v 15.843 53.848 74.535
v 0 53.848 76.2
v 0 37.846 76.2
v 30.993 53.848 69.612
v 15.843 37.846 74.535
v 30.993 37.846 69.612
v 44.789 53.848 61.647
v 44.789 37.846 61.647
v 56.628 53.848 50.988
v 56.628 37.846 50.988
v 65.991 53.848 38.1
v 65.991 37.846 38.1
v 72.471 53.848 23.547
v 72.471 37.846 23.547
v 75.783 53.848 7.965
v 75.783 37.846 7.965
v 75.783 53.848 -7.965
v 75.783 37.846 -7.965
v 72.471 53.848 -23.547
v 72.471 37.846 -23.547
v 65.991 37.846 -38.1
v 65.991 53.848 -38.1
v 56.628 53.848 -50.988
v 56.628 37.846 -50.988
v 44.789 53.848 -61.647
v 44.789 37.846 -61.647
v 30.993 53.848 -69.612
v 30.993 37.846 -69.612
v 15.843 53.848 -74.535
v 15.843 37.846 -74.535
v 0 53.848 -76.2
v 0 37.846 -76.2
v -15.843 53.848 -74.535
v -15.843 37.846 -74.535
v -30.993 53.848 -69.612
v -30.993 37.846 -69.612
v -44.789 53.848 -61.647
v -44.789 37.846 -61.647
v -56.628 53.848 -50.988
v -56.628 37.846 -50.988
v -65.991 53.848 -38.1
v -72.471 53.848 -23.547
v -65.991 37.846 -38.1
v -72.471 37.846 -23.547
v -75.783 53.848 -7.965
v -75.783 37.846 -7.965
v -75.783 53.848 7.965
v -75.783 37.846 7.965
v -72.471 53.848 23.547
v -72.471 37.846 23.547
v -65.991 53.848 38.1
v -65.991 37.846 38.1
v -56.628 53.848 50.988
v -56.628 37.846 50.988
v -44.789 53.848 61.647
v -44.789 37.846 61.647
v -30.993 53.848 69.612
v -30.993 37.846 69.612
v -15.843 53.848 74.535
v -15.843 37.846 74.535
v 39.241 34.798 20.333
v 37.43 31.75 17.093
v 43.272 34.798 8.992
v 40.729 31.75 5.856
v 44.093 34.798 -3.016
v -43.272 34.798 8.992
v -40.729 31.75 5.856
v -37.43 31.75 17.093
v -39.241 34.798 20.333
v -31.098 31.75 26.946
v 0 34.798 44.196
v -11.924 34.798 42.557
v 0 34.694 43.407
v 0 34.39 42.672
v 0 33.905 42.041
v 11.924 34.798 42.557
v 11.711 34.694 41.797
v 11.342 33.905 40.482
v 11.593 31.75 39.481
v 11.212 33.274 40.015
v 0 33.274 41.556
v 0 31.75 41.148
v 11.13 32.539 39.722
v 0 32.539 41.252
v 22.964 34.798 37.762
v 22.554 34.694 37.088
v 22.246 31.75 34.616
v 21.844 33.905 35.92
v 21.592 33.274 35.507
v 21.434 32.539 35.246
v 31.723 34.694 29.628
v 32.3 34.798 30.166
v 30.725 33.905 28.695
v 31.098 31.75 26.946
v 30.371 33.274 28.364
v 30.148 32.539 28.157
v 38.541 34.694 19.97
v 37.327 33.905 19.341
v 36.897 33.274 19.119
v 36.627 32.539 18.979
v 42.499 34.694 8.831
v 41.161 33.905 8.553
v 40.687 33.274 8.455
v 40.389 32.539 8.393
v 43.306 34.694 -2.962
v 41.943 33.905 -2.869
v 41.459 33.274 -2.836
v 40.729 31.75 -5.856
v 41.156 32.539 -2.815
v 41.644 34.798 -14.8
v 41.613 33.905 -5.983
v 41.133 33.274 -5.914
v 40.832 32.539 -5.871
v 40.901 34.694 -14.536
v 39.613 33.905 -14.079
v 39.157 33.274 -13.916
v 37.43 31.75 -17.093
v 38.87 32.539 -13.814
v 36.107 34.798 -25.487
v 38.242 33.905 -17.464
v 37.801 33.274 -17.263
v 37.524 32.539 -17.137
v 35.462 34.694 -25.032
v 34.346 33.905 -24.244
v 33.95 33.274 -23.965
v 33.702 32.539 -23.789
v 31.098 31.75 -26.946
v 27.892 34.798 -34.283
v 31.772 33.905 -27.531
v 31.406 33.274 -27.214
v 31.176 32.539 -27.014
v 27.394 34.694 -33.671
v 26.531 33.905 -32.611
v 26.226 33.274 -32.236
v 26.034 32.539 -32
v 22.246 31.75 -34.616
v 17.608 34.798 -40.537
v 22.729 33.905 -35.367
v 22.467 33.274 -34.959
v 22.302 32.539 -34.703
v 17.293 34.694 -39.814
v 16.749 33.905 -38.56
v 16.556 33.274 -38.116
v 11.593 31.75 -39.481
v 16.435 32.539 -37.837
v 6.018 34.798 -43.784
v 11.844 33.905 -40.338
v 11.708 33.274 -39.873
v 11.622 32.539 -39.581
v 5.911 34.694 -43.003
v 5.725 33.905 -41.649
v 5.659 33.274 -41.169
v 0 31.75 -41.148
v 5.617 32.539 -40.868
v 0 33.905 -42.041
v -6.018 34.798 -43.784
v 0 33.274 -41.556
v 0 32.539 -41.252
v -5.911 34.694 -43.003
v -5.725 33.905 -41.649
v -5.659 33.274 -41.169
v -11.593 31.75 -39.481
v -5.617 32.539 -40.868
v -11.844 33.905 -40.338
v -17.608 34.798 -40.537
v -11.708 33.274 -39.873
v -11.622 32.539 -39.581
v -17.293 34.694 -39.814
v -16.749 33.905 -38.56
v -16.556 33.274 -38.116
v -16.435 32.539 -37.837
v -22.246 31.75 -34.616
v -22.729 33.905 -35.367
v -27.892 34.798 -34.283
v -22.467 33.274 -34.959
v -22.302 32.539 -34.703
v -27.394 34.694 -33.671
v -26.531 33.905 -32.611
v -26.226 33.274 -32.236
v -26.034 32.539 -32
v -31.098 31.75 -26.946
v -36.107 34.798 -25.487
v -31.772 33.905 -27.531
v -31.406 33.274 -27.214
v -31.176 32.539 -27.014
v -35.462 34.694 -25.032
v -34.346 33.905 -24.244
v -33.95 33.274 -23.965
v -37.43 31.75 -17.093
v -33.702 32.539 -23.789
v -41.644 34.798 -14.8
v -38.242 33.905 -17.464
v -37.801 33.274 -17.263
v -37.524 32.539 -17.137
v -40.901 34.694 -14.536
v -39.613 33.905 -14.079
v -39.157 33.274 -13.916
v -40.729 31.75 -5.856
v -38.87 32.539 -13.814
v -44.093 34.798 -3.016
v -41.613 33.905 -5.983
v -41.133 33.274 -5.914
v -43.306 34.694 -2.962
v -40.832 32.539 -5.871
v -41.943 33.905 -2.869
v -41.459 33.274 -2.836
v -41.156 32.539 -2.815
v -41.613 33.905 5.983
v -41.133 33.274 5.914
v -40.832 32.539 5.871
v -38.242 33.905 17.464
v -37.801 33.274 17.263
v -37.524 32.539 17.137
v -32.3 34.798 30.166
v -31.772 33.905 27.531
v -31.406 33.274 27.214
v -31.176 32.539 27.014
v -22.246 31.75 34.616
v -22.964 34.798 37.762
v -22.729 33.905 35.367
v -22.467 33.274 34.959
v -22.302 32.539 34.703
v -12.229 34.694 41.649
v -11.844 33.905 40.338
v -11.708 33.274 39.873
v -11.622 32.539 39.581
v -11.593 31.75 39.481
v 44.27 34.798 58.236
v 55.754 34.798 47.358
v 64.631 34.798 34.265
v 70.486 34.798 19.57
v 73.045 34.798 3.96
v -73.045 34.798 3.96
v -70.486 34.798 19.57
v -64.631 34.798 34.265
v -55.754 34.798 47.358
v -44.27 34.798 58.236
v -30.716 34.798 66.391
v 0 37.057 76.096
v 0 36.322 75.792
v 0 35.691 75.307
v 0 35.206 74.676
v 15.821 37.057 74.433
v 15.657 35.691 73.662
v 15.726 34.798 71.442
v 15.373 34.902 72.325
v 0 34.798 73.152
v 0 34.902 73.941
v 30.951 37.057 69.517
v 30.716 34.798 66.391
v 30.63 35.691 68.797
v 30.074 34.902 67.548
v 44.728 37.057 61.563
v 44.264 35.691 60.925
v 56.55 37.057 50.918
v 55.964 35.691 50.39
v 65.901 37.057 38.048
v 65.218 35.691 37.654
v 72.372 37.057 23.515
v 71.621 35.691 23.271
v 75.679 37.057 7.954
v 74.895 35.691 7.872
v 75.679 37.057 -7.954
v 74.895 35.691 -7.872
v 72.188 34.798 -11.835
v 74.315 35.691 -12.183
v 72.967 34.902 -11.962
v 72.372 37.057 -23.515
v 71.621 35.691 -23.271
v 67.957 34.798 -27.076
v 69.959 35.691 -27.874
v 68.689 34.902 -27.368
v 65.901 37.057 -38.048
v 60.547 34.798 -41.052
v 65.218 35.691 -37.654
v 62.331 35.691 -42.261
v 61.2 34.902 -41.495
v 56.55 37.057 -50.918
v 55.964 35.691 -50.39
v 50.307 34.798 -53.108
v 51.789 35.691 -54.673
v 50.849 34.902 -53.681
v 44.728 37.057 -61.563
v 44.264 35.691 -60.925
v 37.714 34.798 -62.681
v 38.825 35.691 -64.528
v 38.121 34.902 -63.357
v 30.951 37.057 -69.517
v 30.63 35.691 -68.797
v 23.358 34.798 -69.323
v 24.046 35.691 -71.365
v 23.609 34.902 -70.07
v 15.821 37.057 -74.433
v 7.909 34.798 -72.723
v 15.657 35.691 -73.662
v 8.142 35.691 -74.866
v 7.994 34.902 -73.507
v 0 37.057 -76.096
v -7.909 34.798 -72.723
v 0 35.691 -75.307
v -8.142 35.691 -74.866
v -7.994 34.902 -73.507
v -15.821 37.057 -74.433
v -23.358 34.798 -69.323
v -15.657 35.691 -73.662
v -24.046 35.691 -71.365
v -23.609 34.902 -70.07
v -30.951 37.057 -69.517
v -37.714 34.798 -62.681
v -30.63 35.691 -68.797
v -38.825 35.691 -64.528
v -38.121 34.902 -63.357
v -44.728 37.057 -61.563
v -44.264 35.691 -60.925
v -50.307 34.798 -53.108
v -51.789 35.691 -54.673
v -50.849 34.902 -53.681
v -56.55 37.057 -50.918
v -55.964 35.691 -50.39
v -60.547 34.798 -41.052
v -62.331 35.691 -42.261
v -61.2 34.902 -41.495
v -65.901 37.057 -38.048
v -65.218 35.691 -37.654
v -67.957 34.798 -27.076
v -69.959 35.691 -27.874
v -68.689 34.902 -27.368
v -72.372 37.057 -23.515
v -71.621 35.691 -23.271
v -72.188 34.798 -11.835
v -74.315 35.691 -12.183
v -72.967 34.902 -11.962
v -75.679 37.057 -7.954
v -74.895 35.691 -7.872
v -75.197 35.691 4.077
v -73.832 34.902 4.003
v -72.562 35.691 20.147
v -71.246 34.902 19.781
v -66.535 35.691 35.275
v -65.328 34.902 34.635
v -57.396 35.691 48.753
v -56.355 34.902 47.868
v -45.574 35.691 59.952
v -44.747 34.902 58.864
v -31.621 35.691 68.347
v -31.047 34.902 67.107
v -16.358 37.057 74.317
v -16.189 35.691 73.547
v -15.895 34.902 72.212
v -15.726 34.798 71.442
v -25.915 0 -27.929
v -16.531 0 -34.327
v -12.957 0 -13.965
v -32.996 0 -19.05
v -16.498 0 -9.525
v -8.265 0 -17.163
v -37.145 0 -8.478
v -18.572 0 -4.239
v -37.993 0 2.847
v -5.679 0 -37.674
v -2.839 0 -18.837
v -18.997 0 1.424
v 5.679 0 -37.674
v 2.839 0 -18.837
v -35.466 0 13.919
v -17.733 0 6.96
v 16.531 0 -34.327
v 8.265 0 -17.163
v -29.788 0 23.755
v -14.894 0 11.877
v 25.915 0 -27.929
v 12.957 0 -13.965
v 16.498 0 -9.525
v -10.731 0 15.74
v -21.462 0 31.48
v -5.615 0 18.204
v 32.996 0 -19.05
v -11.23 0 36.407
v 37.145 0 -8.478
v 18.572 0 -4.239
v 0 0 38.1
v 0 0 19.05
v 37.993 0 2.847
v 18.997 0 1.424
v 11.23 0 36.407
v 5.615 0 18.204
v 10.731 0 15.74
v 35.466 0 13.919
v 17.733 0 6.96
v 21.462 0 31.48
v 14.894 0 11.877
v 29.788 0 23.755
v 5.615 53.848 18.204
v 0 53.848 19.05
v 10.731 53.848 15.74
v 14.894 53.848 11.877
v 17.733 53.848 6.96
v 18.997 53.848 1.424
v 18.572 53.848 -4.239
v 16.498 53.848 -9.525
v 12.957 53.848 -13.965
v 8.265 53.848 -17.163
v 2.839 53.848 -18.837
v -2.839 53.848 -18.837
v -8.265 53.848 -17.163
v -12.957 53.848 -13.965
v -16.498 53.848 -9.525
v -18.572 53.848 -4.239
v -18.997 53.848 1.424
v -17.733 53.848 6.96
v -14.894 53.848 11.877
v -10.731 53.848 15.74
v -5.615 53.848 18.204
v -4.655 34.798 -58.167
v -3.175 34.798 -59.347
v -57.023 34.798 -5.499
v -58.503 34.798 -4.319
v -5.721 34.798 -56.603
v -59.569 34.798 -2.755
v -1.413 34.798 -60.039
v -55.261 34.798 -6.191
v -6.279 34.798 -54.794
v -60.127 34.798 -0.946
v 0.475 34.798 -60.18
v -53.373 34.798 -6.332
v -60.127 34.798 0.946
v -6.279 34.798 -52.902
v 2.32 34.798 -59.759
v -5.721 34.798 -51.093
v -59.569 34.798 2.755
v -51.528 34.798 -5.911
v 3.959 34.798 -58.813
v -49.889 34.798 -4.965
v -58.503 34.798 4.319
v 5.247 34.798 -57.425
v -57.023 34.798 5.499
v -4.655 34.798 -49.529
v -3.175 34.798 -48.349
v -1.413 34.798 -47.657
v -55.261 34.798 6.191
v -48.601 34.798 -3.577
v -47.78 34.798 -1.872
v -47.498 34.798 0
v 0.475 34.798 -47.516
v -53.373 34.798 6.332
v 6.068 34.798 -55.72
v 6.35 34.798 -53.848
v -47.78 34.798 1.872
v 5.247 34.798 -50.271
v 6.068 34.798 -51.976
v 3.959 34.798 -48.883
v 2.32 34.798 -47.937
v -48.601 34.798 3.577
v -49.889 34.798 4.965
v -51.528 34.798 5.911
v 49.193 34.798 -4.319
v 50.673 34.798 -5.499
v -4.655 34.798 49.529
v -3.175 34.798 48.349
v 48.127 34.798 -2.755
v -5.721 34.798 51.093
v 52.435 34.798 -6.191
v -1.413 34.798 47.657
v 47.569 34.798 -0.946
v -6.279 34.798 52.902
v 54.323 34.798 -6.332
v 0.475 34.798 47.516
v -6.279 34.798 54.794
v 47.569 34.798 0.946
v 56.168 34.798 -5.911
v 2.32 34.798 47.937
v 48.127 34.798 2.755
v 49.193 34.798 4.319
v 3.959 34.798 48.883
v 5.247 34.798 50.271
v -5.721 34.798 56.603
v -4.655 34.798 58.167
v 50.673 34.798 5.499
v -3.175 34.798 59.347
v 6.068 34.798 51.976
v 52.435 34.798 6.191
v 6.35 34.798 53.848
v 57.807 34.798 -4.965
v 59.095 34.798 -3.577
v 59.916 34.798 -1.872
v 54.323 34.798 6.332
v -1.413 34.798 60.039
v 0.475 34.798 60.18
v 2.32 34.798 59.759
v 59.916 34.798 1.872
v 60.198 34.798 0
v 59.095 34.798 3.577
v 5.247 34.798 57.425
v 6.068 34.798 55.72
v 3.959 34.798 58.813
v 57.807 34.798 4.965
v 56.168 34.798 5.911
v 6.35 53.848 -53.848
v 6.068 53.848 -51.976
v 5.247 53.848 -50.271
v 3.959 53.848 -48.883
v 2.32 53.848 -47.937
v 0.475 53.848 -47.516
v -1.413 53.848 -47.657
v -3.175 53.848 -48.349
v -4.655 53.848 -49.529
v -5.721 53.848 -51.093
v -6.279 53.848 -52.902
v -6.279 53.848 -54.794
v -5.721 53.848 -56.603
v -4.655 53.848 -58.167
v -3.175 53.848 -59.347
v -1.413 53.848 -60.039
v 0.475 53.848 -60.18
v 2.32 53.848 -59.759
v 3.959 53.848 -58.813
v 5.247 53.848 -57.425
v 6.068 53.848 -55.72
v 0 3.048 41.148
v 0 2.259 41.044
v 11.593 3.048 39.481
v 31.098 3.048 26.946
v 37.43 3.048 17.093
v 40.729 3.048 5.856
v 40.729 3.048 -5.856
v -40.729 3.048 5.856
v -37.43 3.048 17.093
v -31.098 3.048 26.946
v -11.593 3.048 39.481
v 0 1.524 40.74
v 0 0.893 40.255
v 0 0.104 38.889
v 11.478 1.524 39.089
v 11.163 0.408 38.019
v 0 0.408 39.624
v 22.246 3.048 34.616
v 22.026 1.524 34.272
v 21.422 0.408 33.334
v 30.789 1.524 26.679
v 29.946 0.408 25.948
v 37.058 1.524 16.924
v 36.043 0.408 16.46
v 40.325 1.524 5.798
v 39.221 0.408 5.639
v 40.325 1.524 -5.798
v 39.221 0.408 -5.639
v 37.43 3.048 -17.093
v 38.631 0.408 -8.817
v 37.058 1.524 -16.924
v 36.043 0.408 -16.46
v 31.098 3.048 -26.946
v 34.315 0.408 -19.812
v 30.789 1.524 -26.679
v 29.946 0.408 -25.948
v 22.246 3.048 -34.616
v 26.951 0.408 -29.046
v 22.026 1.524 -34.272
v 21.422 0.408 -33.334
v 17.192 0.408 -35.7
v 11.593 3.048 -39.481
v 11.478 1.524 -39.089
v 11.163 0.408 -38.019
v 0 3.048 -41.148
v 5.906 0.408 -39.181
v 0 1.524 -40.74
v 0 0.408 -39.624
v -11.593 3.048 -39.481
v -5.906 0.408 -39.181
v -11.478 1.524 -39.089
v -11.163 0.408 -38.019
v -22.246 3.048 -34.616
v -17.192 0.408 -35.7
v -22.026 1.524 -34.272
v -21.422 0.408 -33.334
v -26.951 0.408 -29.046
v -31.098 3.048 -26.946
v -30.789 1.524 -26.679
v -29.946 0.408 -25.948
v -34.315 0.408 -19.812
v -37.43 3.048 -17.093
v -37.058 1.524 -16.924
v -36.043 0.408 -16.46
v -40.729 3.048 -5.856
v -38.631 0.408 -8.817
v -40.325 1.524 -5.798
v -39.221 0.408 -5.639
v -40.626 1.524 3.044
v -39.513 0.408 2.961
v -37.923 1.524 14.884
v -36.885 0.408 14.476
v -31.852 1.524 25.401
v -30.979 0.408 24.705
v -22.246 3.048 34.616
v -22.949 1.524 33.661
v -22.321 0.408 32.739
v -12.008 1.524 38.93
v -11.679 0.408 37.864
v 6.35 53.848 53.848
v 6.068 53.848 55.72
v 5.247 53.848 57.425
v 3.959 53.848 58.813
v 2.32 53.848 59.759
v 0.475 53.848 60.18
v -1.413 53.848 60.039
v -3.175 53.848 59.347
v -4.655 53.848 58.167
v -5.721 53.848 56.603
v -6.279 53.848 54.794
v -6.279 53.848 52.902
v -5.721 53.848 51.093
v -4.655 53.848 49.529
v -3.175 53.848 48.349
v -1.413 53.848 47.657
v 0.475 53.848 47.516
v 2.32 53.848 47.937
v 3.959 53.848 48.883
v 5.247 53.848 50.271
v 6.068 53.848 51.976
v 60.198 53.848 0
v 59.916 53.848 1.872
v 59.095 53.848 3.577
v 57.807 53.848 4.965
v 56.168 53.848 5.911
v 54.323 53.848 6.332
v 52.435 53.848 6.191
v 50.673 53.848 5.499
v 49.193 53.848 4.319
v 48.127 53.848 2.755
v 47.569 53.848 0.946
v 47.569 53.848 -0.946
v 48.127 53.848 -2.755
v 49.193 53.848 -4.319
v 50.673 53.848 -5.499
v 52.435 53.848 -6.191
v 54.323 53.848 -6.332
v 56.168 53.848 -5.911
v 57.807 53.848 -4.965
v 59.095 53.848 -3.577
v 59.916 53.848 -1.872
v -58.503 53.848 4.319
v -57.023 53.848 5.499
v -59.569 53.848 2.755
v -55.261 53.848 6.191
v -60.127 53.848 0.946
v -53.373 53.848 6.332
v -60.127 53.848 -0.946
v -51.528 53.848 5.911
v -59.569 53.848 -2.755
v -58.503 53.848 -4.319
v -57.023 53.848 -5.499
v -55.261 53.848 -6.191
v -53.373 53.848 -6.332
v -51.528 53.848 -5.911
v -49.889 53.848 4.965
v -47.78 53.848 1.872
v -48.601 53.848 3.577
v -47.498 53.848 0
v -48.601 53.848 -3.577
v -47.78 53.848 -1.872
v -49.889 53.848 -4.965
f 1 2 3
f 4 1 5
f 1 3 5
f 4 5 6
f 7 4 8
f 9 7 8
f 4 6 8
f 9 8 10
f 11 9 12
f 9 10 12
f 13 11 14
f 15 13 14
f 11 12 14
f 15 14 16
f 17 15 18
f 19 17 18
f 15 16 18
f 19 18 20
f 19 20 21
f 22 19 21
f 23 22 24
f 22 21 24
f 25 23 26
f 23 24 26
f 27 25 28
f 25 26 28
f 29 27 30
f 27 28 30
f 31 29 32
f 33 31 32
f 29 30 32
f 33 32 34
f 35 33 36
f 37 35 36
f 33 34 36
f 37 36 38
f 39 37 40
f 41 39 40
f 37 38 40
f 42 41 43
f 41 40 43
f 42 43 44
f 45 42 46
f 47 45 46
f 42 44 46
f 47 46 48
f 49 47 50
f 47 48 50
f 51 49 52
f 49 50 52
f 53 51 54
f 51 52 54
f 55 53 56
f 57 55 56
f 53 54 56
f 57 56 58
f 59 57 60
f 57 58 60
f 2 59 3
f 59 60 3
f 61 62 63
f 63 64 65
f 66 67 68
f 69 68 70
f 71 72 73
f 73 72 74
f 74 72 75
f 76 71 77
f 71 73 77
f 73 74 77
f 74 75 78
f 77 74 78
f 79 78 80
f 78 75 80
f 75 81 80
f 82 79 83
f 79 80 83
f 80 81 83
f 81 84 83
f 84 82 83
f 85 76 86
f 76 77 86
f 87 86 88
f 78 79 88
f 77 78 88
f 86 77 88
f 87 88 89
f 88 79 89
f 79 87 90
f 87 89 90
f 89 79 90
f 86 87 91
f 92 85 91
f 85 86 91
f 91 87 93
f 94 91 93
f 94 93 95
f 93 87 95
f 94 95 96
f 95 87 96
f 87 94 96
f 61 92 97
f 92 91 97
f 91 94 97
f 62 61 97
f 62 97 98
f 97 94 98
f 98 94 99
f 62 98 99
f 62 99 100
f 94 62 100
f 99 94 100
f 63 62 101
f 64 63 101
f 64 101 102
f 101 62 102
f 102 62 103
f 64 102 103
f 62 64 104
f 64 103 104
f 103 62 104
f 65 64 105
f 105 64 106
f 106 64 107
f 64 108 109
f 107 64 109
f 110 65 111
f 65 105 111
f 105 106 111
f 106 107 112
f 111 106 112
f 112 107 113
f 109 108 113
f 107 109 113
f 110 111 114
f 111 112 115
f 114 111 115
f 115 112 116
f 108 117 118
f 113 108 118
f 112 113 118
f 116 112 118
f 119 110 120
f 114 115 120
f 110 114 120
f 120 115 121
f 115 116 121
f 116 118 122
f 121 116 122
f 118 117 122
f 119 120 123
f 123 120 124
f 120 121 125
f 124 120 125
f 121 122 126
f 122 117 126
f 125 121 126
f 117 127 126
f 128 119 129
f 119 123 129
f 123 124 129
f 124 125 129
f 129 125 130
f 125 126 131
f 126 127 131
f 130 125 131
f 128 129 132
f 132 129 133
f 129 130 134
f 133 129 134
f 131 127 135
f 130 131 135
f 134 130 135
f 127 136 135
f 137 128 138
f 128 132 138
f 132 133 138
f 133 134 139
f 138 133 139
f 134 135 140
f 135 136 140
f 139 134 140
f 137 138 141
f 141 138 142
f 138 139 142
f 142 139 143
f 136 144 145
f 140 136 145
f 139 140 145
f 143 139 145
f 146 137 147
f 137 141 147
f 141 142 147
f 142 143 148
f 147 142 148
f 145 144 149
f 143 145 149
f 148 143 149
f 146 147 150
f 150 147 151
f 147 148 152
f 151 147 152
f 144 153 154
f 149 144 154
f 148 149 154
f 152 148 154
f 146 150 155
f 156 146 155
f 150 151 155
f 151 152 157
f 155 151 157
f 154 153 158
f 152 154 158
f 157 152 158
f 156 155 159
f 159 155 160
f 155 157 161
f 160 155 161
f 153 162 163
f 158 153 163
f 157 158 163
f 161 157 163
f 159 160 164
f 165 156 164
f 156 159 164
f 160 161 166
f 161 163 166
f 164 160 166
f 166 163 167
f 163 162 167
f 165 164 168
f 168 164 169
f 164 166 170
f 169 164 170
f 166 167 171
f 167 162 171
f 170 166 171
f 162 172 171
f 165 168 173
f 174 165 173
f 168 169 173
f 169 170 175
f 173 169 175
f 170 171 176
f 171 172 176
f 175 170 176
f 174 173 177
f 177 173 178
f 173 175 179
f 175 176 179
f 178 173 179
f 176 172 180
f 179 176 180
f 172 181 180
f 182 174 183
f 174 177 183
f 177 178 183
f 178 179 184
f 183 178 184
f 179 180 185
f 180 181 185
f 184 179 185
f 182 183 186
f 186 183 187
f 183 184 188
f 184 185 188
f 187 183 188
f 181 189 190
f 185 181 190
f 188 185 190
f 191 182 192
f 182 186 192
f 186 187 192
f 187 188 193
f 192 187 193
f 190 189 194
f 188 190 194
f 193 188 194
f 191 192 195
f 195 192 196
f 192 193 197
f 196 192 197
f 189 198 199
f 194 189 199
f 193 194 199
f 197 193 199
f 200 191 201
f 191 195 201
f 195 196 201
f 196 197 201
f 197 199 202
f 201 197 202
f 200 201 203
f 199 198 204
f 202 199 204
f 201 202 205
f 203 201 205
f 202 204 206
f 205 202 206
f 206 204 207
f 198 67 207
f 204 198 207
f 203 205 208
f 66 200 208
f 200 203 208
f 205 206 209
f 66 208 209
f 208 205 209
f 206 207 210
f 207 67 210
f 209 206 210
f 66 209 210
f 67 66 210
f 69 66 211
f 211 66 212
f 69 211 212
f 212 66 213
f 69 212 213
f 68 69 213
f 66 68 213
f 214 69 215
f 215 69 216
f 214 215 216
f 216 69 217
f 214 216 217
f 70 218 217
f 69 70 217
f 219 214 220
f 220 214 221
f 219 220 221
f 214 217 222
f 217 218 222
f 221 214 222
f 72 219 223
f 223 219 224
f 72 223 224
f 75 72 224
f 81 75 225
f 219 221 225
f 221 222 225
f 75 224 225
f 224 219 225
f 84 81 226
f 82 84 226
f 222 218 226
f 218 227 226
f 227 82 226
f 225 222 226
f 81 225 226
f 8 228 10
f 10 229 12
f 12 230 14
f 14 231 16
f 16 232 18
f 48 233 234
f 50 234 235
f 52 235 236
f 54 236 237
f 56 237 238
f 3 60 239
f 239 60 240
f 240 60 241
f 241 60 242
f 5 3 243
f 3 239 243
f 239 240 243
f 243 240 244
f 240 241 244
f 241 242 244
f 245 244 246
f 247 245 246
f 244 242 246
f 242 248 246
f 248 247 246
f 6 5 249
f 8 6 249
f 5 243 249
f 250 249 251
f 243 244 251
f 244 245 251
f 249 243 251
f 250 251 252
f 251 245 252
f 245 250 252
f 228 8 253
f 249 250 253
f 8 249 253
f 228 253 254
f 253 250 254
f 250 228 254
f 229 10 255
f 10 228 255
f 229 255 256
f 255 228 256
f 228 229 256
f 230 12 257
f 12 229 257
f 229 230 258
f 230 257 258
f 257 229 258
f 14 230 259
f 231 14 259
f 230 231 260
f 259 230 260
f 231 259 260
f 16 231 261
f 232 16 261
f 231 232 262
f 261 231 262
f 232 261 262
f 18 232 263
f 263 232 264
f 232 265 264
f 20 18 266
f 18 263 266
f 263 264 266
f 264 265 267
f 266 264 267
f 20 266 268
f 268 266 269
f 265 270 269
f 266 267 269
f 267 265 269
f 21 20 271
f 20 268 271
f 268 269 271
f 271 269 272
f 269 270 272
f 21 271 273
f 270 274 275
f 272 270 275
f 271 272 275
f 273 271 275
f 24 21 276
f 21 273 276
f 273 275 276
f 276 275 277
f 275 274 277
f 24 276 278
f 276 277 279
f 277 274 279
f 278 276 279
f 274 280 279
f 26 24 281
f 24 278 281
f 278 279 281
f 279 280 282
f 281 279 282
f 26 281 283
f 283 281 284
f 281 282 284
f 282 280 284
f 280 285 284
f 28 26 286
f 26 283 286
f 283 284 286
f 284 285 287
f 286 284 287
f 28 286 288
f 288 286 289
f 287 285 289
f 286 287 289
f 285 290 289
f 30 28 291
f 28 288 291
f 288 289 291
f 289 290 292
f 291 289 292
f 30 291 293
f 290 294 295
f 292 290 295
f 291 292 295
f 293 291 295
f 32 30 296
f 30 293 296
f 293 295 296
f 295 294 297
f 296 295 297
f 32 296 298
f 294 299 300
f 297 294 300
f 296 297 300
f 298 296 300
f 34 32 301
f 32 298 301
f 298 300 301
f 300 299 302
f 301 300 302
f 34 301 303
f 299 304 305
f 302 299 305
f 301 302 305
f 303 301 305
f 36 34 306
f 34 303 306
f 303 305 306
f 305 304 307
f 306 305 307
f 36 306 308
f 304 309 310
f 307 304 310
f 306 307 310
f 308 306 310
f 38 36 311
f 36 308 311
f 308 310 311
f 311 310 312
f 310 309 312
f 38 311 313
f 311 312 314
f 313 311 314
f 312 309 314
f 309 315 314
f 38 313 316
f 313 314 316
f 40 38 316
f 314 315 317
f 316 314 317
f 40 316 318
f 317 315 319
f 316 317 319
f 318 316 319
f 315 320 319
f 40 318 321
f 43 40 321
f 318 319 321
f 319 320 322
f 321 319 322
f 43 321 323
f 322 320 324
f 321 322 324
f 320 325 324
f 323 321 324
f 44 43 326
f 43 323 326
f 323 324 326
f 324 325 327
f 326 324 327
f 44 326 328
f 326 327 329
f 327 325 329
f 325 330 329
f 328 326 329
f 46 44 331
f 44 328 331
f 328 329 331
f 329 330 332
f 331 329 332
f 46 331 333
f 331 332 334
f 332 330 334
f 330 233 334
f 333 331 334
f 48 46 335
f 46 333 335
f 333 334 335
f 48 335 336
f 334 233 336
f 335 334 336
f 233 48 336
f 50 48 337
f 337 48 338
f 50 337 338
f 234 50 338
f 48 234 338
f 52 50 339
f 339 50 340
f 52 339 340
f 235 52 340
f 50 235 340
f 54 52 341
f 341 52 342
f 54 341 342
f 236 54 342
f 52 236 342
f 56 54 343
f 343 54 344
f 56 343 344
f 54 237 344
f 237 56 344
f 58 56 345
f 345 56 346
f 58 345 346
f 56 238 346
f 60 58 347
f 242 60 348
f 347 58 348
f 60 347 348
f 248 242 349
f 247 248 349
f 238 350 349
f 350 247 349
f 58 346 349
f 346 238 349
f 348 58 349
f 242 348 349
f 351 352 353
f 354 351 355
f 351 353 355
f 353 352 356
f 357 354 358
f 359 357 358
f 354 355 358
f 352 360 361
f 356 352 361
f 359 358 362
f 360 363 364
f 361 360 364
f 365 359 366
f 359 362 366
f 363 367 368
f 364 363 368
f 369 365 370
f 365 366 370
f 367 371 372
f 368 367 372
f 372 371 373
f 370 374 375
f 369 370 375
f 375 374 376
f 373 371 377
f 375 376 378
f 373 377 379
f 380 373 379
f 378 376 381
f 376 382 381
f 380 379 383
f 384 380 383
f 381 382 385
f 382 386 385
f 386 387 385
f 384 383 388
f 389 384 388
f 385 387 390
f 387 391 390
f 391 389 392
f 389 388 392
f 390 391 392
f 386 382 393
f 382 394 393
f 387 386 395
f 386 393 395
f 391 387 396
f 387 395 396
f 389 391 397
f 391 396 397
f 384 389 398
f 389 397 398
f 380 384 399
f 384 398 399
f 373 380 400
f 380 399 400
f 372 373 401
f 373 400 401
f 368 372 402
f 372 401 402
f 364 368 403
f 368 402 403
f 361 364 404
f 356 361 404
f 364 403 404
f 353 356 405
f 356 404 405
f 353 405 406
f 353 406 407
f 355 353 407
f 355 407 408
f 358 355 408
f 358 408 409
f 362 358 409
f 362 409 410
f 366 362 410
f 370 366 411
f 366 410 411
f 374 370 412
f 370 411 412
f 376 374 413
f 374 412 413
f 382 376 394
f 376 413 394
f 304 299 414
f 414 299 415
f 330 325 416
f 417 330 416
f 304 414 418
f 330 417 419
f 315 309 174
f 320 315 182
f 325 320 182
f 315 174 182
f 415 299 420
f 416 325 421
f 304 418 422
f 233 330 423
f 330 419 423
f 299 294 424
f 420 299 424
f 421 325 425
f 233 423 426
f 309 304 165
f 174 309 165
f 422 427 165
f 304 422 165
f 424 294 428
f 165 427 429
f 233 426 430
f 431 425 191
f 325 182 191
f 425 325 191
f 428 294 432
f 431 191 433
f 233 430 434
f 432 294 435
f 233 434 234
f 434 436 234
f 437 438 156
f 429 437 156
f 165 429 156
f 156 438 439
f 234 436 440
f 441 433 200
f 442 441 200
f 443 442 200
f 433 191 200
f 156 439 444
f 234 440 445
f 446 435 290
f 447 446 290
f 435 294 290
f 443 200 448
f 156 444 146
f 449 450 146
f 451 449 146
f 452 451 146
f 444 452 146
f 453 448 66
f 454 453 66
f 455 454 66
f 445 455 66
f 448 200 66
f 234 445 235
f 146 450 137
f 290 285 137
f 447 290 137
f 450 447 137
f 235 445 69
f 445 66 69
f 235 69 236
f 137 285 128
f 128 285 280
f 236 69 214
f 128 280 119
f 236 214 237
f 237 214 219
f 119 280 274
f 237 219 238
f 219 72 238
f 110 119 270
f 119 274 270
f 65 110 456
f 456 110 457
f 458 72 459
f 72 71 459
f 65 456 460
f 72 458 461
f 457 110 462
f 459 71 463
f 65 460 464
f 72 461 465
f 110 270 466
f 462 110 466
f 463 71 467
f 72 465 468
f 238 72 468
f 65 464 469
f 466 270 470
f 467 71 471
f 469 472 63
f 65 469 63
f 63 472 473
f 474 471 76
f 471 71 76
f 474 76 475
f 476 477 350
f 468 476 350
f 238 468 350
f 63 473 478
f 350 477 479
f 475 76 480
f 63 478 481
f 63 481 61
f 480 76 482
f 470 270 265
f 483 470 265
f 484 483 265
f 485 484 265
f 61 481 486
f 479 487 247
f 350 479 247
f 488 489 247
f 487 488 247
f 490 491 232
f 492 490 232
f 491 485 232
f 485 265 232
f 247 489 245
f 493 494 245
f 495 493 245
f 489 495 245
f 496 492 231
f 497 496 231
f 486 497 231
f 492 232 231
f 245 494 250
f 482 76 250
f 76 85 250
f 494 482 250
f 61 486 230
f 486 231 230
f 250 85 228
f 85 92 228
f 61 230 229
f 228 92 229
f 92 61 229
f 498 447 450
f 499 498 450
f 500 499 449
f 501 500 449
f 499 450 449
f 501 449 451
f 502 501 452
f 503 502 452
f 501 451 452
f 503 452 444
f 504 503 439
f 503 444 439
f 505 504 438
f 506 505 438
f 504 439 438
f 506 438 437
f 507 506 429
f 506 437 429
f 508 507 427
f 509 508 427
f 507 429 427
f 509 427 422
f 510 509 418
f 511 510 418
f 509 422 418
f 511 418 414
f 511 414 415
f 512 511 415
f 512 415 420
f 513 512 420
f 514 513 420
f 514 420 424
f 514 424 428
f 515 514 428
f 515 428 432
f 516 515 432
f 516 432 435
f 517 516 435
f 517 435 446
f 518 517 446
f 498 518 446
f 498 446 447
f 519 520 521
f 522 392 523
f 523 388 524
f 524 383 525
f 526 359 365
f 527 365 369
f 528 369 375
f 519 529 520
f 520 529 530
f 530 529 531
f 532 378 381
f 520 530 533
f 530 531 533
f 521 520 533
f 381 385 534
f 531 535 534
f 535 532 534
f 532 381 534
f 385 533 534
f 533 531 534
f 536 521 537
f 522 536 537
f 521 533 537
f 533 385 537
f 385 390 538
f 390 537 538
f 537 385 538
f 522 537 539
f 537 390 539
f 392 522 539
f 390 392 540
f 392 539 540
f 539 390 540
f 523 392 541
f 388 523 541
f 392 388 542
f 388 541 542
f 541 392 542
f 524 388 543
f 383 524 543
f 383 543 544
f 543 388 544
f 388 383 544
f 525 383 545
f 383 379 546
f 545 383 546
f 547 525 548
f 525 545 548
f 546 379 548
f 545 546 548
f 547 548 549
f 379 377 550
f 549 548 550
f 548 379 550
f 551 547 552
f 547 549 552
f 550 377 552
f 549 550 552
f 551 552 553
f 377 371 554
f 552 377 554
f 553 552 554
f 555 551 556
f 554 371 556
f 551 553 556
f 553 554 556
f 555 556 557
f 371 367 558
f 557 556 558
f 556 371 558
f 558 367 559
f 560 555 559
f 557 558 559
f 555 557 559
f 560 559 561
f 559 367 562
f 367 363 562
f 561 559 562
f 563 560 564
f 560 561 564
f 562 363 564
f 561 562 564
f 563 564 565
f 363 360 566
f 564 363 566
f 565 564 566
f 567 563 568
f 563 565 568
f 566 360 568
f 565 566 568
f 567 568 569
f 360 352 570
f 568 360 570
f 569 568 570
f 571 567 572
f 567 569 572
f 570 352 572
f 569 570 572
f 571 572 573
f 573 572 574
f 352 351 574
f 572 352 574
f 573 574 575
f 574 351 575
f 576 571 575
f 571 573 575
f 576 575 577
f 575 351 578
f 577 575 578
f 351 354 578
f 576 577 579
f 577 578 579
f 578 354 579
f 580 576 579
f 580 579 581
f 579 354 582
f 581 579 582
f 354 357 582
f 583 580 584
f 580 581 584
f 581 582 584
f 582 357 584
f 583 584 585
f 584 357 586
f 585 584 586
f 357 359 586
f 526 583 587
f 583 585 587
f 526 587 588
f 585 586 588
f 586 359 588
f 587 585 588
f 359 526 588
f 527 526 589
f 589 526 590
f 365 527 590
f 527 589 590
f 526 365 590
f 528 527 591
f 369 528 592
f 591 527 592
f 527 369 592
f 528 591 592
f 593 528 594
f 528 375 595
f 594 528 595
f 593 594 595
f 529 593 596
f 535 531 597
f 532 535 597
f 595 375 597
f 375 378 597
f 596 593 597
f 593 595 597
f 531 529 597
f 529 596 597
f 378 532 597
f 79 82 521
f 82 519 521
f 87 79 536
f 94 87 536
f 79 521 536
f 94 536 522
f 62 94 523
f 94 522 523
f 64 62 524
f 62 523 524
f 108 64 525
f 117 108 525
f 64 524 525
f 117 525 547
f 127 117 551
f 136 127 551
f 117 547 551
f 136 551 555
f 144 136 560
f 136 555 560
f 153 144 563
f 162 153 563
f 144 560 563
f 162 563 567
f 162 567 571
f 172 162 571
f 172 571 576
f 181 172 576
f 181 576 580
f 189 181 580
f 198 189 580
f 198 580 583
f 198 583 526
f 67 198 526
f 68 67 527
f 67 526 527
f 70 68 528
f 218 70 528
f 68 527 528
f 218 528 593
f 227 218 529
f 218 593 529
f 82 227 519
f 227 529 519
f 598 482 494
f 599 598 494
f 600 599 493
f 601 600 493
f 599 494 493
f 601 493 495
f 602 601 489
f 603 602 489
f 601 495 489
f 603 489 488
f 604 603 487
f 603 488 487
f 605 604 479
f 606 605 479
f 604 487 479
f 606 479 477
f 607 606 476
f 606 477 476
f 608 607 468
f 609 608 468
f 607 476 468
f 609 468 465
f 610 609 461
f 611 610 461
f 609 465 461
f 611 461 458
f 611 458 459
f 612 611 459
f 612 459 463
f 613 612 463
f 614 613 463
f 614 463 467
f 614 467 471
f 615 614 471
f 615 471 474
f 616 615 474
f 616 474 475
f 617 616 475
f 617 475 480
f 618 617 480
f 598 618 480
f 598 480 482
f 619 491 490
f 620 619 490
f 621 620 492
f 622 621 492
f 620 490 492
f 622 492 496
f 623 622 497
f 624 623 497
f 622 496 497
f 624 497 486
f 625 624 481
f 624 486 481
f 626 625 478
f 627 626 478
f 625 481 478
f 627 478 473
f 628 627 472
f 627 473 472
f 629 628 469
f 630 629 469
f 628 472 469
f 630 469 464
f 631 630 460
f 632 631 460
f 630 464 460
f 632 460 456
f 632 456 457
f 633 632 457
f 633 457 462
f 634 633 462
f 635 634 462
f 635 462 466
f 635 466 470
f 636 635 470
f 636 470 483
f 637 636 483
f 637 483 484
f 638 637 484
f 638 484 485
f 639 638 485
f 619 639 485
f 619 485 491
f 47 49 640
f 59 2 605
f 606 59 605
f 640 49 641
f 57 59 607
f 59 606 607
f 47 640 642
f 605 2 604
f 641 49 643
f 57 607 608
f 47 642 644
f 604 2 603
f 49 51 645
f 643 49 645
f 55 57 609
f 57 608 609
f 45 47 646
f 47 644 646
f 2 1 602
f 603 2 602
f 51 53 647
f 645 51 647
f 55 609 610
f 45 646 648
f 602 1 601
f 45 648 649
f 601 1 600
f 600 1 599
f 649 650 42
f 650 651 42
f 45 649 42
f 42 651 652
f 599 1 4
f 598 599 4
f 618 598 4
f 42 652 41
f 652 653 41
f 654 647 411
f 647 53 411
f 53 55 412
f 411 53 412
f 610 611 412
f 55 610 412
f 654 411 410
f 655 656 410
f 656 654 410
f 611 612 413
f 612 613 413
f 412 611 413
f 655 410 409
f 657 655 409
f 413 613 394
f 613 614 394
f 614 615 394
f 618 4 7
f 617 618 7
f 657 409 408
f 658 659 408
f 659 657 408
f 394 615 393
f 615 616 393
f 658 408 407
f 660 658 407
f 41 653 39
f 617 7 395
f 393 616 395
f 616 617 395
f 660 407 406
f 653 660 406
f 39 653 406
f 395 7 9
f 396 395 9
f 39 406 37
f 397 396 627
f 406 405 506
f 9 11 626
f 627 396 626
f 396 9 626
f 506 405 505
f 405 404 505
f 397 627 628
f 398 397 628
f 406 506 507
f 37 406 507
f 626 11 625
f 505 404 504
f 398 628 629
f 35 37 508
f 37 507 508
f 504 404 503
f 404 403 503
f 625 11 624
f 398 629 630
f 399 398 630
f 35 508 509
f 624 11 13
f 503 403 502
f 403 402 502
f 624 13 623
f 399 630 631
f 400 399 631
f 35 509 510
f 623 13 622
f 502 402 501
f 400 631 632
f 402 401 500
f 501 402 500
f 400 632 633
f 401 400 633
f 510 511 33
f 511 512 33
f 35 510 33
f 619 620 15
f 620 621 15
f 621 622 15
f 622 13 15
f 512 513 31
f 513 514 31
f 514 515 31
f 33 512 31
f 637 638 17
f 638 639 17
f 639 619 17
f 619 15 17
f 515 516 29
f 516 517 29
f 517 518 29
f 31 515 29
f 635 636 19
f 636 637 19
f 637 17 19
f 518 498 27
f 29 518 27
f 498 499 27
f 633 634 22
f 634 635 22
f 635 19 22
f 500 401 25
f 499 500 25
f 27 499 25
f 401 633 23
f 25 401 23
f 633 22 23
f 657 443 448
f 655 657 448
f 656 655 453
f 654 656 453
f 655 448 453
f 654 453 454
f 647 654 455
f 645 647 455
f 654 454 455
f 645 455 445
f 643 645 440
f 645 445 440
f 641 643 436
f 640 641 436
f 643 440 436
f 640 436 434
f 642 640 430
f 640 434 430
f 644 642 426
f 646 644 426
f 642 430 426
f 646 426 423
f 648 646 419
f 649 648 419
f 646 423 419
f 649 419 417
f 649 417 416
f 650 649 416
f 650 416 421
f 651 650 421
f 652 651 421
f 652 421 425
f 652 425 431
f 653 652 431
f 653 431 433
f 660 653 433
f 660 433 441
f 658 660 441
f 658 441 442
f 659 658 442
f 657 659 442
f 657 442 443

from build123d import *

# Parameters (mm, degrees)
F2_R     = 6.35
F3_DEPTH = 19.051


with BuildPart() as f1:
    # F0 (on Right) → F1 (revolve)
    with BuildSketch(Plane.YZ):
        with BuildLine():
            Line((0, 19.05), (53.848, 19.05))
            Line((53.848, 19.05), (53.848, 76.2))
            Line((53.848, 76.2), (37.846, 76.2))
            ThreePointArc((37.846, 76.2), (35.690739, 75.307261), (34.798, 73.152))
            Line((34.798, 73.152), (34.798, 44.196))
            ThreePointArc((34.798, 44.196), (33.905261, 42.040739), (31.75, 41.148))
            Line((31.75, 41.148), (3.048, 41.148))
            ThreePointArc((3.048, 41.148), (0.892739, 40.255261), (0, 38.1))
            Line((0, 38.1), (0, 19.05))
        make_face()
    revolve(axis=Axis((0, 35.464443, 0), (0, 1, 0)))

    # F2 (on face) → F3 (cut, through all)
    with BuildSketch(Plane.XZ.offset(-34.798)):
        with Locations((0, 53.848)):
            Circle(F2_R)
        with Locations((53.848, 0)):
            Circle(F2_R)
        with Locations((0, -53.848)):
            Circle(F2_R)
        with Locations((-53.848, 0)):
            Circle(F2_R)
    extrude(amount=-F3_DEPTH, mode=Mode.SUBTRACT)


solid = f1.part
